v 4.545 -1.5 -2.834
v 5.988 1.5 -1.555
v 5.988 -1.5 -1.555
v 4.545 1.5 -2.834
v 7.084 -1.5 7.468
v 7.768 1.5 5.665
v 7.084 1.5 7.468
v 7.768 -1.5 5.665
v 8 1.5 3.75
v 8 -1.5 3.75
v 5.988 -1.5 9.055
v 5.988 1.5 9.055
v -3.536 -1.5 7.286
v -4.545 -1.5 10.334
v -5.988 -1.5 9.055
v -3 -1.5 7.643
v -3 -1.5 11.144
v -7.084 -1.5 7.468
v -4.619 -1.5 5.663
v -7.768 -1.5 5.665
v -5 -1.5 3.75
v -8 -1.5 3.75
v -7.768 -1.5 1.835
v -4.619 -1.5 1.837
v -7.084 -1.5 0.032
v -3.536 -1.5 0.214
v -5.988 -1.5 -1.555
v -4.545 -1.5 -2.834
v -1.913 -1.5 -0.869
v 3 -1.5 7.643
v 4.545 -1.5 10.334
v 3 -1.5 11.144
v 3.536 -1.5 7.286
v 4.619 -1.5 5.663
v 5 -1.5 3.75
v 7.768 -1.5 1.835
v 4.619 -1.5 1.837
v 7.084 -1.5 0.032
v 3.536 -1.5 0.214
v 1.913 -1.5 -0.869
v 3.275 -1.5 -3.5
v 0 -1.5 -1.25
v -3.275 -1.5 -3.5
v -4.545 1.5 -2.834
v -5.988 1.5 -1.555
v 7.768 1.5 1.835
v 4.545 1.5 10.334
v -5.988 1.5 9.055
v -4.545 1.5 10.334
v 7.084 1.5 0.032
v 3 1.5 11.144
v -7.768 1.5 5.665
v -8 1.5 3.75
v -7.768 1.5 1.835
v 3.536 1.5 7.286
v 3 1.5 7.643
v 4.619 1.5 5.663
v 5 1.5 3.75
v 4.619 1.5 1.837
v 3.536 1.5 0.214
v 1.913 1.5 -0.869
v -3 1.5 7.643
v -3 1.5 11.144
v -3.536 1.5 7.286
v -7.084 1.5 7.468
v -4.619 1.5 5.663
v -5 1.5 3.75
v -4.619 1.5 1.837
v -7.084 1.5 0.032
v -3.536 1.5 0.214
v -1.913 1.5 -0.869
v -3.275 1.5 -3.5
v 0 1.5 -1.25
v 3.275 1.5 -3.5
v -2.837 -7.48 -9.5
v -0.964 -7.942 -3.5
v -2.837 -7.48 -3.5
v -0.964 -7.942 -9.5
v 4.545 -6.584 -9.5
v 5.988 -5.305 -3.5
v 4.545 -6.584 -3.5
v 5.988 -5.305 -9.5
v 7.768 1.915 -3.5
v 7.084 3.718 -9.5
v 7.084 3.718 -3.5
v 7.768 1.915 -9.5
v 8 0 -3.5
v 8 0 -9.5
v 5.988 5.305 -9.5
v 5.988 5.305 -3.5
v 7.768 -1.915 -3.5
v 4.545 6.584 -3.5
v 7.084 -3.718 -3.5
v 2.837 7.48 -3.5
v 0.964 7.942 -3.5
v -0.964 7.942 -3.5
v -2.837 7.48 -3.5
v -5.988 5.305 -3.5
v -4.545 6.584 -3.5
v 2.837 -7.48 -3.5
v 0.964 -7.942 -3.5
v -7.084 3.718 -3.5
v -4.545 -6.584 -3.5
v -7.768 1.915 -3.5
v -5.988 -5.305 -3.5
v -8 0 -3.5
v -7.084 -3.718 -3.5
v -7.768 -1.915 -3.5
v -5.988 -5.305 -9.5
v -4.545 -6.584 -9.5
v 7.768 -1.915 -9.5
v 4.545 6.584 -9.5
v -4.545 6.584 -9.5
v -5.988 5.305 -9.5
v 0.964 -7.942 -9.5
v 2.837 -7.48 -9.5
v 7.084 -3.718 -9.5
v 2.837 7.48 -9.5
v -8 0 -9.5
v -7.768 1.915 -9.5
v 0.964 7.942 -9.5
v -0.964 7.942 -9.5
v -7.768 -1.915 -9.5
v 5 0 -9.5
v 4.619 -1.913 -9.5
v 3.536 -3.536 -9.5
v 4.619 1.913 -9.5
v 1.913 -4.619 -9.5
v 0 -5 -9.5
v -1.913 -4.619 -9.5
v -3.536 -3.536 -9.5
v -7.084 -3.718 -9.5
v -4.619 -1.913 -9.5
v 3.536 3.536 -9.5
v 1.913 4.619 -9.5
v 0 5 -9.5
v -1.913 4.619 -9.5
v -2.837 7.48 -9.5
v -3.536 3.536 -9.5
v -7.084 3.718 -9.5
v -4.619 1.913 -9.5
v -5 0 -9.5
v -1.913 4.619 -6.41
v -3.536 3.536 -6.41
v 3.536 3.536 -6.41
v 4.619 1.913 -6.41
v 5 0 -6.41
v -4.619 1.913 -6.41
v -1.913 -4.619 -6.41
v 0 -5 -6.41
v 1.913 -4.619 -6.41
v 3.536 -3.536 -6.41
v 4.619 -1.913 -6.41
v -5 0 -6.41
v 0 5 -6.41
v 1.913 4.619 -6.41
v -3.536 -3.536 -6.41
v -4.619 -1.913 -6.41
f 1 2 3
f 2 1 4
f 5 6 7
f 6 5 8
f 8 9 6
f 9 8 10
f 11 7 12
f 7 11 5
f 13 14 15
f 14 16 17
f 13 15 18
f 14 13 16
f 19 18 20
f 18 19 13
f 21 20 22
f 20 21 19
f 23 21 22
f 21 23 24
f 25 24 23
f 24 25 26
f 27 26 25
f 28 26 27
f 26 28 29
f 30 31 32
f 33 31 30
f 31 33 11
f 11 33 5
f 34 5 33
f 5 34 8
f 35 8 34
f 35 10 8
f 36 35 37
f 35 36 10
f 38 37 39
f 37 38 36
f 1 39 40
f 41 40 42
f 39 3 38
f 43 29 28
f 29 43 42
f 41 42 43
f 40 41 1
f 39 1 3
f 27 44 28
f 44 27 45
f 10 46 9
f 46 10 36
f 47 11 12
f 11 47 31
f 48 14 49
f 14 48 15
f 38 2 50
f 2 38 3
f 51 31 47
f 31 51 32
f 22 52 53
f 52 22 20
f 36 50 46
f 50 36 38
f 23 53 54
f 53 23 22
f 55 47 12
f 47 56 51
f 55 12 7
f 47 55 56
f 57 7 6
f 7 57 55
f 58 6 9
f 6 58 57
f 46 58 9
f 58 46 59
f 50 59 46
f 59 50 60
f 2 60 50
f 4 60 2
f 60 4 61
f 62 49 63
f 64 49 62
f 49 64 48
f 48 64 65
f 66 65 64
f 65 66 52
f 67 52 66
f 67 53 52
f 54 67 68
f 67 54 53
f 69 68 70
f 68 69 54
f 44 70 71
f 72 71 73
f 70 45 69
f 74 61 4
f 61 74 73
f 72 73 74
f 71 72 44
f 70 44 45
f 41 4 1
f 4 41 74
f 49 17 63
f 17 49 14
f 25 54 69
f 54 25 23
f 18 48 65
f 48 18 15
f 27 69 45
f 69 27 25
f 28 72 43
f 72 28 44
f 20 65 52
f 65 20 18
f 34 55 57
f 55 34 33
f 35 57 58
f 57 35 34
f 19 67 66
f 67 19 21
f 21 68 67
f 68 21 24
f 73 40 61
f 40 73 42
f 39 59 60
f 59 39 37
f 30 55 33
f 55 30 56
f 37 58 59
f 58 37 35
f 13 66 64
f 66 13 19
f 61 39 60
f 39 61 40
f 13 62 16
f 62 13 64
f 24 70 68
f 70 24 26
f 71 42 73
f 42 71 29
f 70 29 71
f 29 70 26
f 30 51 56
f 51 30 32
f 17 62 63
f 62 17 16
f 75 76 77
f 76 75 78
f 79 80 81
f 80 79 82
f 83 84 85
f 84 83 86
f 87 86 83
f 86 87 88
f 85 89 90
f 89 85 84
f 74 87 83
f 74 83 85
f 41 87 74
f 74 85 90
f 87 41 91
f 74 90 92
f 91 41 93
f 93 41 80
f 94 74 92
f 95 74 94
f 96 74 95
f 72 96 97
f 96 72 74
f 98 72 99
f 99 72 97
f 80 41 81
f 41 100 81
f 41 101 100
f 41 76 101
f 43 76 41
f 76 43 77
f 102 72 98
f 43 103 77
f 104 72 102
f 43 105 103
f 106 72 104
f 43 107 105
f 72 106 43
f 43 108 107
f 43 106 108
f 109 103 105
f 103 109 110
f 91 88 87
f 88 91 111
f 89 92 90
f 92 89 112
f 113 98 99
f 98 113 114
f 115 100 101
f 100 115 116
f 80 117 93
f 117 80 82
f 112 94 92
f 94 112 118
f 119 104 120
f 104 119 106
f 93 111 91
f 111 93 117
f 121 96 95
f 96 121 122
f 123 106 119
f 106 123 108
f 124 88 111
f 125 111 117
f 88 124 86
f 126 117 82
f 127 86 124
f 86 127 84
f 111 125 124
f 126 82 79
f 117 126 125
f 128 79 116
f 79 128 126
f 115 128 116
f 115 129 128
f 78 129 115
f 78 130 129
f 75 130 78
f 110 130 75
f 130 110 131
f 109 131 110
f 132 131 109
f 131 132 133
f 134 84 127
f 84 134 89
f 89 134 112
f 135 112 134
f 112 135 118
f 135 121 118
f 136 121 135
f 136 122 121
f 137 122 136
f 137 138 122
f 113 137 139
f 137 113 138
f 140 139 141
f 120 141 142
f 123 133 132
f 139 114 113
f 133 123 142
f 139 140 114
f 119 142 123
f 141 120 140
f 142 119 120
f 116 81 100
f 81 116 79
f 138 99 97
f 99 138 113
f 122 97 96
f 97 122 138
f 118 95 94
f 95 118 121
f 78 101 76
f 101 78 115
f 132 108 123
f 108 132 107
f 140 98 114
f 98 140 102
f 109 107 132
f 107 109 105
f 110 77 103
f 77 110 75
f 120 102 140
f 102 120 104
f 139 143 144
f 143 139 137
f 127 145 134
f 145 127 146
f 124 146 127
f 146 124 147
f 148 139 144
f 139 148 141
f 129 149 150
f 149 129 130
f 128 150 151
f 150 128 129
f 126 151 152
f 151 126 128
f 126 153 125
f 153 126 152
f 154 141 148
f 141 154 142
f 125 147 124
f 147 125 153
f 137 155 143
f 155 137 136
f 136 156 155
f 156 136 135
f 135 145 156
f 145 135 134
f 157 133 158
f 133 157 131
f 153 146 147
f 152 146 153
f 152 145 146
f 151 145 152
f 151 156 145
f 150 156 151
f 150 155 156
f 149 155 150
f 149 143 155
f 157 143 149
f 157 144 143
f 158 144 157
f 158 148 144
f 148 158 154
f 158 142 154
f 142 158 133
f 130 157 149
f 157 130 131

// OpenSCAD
magnetic_tube_holder();

module magnetic_tube_holder(
   wandstaerke          = 3,
   schlauch_durchmesser = 10,
   magnet_durchmesser   = 10,
   magnet_dicke         = 3
) {
    union() {
        translate([0, 0, (wandstaerke * 1.5 + magnet_dicke) / 2]) {
            schlauch_schelle(
                wandstaerke = wandstaerke,
                schlauch_durchmesser = schlauch_durchmesser
            );
            translate([
                0,
                0,
                (
                  schlauch_durchmesser
                  + wandstaerke * 2.5
                  + magnet_dicke
                ) / -2
            ]) {
                magnet_gehaeuse(
                    wandstaerke = wandstaerke,
                    magnet_durchmesser = magnet_durchmesser,
                    magnet_dicke       = magnet_dicke
                );
            }
        }
    }
}

module schlauch_schelle(
   wandstaerke          = 1,
   schlauch_durchmesser = 5
) {
    difference() {
        rotate([90, 0, 0]) {
            difference() {
                cylinder(
                    d = schlauch_durchmesser + wandstaerke * 2,
                    h = wandstaerke,
                    center = true
                );
                cylinder(
                    d = schlauch_durchmesser,
                    h = wandstaerke * 1.1,
                    center = true
                );
            }
        }
        translate([
            0,
            0,
            wandstaerke
        ])
        cube([
                schlauch_durchmesser * 0.6,
                wandstaerke * 1.1,
                schlauch_durchmesser
            ],
            center = true
        );
    }
}

module magnet_gehaeuse(
   wandstaerke          = 1,
   magnet_durchmesser   = 5,
   magnet_dicke         = 1
) {
    difference() {
        cylinder(
            h = magnet_dicke + wandstaerke,
            d = magnet_durchmesser + wandstaerke * 2,
            center = true
        );
        translate([0, 0, wandstaerke / -2 + 0.04]) {
            cylinder(h = magnet_dicke + 0.1, d = magnet_durchmesser, center = true);
        }
    }
}
